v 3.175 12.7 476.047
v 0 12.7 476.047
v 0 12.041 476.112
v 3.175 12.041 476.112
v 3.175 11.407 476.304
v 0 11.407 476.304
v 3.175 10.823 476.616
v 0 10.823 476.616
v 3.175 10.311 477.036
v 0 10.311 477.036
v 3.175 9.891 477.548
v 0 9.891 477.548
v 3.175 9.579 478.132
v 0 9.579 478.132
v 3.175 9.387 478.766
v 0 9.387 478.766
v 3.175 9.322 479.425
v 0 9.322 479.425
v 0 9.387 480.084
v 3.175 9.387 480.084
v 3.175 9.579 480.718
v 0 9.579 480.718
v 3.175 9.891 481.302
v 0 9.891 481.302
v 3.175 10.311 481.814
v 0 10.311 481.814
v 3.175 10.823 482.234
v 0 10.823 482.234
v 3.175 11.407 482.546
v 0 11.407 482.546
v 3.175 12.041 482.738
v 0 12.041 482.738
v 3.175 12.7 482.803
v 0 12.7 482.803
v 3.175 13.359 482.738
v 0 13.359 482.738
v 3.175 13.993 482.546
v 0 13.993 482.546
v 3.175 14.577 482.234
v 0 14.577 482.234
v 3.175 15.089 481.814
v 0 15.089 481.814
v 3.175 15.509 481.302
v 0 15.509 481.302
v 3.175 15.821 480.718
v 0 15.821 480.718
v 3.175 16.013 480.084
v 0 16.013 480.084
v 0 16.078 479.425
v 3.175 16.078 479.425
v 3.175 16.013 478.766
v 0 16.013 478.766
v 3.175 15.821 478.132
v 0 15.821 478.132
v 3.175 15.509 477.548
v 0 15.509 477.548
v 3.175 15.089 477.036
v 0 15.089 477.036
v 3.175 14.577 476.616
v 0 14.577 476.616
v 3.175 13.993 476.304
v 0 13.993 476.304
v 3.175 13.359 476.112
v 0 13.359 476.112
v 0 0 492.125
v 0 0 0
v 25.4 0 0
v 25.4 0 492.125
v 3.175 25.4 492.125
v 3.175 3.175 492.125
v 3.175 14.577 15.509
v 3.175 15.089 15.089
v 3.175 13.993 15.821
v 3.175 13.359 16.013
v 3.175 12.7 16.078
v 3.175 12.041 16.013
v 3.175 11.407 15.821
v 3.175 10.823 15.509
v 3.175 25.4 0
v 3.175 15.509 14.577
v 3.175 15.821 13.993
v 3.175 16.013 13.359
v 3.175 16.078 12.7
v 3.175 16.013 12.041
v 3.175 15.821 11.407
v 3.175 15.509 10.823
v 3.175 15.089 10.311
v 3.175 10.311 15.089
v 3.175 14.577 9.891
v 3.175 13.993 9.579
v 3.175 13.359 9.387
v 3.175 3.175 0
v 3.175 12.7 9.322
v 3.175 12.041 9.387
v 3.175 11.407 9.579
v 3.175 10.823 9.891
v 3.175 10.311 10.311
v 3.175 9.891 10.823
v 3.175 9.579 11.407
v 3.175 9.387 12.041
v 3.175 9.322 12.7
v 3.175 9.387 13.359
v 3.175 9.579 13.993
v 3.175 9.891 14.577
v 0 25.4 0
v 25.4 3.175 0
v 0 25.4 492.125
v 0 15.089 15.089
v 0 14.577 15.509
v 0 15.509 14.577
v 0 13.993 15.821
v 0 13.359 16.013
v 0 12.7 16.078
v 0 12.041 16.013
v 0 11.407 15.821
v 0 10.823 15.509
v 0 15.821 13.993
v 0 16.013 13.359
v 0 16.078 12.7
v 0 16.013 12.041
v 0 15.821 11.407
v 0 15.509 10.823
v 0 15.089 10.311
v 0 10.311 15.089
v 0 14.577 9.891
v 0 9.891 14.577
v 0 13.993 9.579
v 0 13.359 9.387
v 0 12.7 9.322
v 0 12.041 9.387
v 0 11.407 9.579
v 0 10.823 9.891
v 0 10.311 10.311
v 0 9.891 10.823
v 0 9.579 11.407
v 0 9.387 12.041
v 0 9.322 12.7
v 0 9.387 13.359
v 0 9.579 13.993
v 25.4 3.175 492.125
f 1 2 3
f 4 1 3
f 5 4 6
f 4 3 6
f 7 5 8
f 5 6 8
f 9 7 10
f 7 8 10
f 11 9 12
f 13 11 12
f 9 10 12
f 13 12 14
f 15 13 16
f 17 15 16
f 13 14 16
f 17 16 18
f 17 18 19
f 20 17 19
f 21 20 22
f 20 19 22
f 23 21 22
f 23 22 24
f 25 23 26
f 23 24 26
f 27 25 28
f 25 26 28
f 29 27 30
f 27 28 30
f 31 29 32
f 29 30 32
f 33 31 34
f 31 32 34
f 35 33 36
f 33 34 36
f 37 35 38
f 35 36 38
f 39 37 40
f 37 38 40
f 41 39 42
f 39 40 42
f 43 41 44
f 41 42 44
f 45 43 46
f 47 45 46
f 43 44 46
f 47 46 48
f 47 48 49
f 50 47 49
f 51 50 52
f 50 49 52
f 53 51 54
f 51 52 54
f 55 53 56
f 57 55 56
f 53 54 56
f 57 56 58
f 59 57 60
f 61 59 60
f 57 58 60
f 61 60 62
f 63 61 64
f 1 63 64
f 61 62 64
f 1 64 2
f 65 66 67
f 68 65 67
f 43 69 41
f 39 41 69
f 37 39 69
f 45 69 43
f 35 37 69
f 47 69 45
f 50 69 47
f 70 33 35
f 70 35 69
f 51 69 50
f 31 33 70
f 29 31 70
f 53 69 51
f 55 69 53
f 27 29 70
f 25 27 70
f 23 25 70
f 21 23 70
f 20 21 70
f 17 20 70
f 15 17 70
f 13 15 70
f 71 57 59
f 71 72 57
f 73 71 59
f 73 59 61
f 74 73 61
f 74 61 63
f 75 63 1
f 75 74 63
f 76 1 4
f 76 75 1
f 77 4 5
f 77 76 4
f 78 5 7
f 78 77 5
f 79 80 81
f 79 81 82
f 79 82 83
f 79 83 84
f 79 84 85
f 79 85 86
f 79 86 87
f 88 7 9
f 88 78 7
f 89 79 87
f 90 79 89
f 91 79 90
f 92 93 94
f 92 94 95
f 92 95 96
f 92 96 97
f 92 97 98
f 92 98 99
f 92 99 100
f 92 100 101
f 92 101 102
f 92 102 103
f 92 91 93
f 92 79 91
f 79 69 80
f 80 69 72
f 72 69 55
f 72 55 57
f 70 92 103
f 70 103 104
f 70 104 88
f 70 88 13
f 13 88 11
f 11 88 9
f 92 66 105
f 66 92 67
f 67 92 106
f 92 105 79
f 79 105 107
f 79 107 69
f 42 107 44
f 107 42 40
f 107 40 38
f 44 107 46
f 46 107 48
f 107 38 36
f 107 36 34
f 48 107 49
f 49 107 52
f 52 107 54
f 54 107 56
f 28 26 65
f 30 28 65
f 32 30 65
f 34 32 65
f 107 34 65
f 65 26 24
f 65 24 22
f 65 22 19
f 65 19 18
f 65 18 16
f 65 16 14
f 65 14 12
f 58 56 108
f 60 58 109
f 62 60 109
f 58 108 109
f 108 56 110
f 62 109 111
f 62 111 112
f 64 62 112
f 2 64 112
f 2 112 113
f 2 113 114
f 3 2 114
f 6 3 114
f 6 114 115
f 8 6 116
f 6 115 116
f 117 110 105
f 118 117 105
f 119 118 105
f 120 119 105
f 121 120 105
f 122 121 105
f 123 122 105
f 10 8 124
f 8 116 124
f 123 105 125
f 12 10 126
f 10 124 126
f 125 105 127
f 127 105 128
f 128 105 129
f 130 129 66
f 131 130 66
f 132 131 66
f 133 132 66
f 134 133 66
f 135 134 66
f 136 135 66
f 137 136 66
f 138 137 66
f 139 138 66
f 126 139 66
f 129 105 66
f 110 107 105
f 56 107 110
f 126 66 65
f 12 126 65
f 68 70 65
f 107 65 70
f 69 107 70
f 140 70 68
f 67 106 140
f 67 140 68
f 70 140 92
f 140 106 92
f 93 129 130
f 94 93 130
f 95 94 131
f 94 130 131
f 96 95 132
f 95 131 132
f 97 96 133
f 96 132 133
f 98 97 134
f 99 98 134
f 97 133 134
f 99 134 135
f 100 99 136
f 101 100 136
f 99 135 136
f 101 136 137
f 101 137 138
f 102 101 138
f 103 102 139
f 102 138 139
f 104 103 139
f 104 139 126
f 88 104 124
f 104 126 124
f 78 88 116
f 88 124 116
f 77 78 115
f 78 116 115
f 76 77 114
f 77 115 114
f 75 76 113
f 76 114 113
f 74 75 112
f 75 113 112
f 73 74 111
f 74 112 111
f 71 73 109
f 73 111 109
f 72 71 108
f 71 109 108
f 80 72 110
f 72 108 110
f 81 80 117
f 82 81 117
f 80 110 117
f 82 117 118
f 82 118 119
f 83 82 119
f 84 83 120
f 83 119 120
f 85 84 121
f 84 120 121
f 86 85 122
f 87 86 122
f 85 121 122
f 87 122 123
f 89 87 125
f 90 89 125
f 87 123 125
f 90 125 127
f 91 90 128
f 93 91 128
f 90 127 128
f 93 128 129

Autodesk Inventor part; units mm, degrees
ref_plane "YZ Plane" through (0, 0, 0) normal (1, 0, 0) x (0, 1, 0)
ref_plane "XZ Plane" through (0, 0, 0) normal (0, 1, 0) x (-1, 0, 0)
ref_plane "XY Plane" through (0, 0, 0) normal (0, 0, 1) x (1, 0, 0)
sketch "Sketch1" plane through (0, 0, 0) normal (0, 0, 1) x (1, 0, 0)
  line L0 (0, 25.4) -> (0, 0)
  line L1 (0, 0) -> (25.4, 0)
  line L2 (3.175, 25.4) -> (3.175, 4.953)
  line L3 (4.953, 3.175) -> (25.4, 3.175)
  line L4 (0, 25.4) -> (3.175, 25.4)
  line L5 (25.4, 3.175) -> (25.4, 0)
  line L6 (3.175, 4.953) -> (3.175, 3.175)
  line L7 (4.953, 3.175) -> (3.175, 3.175)
  dimension "d0" = 25.4
  dimension "d1" = 25.4
  dimension "d2" = 3.175
extrude "Extrusion1" add sketch "Sketch1" along normal blind 492.125
sketch "Sketch7" plane through (3.175, 3.175, 0) normal (1, 0, 0) x (0, 0, -1)
  circle A0 centre (-479.425, 9.525) radius 2.8124
  line L0 (0, 22.225) -> (-492.125, 22.225) projected
  line L1 (-492.125, 0) -> (-492.125, 22.225) projected
  circle A1 centre (-12.7, 9.525) radius 2.8124
  point P0 (0, -3.175)
  dimension "d43" = 12.7
  dimension "d44" = 12.7
  dimension "d47" = 466.725
hole "mount" at (3.175, 12.7, 479.425) at (3.175, 12.7, 12.7) direction (-1, 0, 0) diameter 6.7564 depth 25.4 tip angle 118 clearance for "Flat Head Machine Screw (82)" size "1/4" standard "Ansi Unified Screw Threads"
properties part number "angle_L1"
